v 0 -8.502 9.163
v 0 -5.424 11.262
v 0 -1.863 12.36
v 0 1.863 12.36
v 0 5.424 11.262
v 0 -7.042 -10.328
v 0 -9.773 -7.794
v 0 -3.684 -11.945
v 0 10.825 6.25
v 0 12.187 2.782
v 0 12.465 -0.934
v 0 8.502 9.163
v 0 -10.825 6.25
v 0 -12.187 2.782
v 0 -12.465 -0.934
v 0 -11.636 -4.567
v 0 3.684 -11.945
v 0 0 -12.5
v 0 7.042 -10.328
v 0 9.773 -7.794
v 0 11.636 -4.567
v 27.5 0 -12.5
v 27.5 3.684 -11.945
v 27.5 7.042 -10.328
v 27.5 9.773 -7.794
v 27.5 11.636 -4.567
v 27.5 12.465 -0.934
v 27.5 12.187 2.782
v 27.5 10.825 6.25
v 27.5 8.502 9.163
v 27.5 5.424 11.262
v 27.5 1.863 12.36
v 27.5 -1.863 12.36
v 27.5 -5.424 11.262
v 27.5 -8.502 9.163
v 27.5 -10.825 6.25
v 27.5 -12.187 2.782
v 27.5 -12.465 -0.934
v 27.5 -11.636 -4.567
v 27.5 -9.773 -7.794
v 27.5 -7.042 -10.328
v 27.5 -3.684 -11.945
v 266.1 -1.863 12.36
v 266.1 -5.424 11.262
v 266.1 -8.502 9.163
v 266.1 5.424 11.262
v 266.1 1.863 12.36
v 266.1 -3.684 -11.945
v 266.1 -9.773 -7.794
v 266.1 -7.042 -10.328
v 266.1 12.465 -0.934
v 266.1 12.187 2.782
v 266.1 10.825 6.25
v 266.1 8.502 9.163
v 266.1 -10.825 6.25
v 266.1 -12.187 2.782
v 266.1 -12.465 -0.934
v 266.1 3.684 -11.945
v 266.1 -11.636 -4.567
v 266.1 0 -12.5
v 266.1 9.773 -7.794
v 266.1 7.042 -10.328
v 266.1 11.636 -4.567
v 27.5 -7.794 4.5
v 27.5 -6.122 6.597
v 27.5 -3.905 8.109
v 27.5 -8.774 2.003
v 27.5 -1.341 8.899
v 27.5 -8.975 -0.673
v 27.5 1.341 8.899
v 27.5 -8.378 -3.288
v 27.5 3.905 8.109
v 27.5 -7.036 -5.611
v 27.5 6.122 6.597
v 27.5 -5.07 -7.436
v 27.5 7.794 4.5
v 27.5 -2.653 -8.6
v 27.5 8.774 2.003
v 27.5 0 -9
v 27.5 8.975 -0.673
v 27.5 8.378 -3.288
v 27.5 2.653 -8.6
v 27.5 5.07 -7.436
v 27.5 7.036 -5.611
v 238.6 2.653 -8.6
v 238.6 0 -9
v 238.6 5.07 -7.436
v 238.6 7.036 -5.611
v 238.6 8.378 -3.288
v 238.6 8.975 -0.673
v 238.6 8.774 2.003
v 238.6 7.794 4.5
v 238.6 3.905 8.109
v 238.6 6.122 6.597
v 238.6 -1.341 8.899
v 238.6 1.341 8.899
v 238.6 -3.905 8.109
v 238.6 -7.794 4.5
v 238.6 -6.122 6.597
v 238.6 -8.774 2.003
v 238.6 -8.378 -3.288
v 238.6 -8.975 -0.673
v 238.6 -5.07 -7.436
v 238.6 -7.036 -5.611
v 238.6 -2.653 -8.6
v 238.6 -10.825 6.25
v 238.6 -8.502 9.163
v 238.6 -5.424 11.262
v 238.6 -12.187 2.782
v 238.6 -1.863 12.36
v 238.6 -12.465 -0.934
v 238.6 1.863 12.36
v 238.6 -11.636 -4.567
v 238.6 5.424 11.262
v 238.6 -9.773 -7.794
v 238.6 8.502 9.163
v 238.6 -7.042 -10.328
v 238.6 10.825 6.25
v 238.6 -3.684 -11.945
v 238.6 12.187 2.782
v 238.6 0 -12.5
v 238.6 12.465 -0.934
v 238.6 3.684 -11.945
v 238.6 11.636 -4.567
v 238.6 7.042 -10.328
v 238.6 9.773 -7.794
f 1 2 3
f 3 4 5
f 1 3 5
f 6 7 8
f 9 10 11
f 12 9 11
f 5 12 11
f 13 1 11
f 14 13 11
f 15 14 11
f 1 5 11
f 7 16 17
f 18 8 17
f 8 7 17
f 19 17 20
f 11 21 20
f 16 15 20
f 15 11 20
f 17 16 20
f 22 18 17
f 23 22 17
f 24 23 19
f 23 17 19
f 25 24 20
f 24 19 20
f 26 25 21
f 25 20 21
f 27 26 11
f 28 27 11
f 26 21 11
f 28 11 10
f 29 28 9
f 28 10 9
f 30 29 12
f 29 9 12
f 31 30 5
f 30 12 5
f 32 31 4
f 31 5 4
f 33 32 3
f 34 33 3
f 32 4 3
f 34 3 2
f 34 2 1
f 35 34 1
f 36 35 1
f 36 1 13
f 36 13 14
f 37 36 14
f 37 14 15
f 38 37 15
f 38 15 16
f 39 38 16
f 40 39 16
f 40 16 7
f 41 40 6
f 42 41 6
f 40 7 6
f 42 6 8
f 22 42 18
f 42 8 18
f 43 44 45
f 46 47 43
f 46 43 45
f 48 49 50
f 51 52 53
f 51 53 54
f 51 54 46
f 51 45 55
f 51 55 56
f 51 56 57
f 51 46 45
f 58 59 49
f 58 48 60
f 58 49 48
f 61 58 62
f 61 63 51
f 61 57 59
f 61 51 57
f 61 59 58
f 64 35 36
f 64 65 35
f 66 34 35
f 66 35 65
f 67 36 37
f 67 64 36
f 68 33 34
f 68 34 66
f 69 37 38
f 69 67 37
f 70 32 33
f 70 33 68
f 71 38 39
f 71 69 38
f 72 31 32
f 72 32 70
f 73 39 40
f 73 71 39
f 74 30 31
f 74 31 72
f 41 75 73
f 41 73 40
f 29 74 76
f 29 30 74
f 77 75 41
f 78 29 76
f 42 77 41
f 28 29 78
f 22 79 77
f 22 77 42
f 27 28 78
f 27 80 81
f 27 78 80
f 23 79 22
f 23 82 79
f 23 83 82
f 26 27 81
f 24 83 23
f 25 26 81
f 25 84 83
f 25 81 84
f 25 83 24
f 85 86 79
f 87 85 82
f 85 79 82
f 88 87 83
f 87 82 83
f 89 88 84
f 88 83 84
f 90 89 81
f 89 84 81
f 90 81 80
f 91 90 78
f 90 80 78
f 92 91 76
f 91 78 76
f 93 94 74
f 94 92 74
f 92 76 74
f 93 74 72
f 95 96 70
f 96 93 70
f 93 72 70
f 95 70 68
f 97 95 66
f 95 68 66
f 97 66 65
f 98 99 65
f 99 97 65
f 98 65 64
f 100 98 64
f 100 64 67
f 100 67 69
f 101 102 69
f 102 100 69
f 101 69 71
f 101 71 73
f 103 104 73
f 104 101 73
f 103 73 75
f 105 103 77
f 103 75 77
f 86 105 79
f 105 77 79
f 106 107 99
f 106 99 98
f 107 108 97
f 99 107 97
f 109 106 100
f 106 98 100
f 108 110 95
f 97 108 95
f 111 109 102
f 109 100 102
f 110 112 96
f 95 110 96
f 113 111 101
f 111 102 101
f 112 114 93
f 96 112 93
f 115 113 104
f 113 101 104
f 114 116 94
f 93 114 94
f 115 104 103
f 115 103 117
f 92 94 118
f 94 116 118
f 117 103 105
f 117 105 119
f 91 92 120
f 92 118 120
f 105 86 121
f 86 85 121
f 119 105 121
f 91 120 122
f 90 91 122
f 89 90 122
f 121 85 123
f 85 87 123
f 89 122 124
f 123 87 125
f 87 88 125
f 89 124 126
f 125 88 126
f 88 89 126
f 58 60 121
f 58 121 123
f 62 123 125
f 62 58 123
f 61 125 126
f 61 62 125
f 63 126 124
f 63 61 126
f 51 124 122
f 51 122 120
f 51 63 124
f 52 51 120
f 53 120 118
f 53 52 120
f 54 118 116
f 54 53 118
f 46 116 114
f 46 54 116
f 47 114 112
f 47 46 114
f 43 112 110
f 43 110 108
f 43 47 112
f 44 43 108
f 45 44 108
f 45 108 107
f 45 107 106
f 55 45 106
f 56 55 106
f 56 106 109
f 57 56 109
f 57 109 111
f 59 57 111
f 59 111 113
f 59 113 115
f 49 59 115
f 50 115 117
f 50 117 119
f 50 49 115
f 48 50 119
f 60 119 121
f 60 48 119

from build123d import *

# Parameters (mm, degrees)
SKETCH1_R           = 12.5
SKETCH1_R_2         = 9
BOSS_EXTRUDE1_DEPTH = 27.5
SKETCH1_3_R         = 9
BOSS_EXTRUDE2_DEPTH = 266.1
BOSS_EXTRUDE3_START = -27.5
SKETCH2_R           = 12.5
BOSS_EXTRUDE3_DEPTH = 27.5


with BuildPart() as part:
    # Sketch1 → Boss-Extrude1 (new body)
    with BuildSketch(Plane(origin=(0, 0, 0), x_dir=(0, 0, -1), z_dir=(1, 0, 0))):
        Circle(SKETCH1_R)
        Circle(SKETCH1_R_2, mode=Mode.SUBTRACT)
    extrude(amount=BOSS_EXTRUDE1_DEPTH)

    # Sketch1<3> → Boss-Extrude2 (add)
    with BuildSketch(Plane(origin=(0, 0, 0), x_dir=(0, 0, -1), z_dir=(1, 0, 0))):
        Circle(SKETCH1_3_R)
    extrude(amount=BOSS_EXTRUDE2_DEPTH)

    # Sketch2 → Boss-Extrude3 (add)
    with BuildSketch(Plane(origin=(266.1, 0, 0), x_dir=(0, 0, -1), z_dir=(1, 0, 0)).offset(BOSS_EXTRUDE3_START)):
        Circle(SKETCH2_R)
    extrude(amount=BOSS_EXTRUDE3_DEPTH)


solid = part.part
